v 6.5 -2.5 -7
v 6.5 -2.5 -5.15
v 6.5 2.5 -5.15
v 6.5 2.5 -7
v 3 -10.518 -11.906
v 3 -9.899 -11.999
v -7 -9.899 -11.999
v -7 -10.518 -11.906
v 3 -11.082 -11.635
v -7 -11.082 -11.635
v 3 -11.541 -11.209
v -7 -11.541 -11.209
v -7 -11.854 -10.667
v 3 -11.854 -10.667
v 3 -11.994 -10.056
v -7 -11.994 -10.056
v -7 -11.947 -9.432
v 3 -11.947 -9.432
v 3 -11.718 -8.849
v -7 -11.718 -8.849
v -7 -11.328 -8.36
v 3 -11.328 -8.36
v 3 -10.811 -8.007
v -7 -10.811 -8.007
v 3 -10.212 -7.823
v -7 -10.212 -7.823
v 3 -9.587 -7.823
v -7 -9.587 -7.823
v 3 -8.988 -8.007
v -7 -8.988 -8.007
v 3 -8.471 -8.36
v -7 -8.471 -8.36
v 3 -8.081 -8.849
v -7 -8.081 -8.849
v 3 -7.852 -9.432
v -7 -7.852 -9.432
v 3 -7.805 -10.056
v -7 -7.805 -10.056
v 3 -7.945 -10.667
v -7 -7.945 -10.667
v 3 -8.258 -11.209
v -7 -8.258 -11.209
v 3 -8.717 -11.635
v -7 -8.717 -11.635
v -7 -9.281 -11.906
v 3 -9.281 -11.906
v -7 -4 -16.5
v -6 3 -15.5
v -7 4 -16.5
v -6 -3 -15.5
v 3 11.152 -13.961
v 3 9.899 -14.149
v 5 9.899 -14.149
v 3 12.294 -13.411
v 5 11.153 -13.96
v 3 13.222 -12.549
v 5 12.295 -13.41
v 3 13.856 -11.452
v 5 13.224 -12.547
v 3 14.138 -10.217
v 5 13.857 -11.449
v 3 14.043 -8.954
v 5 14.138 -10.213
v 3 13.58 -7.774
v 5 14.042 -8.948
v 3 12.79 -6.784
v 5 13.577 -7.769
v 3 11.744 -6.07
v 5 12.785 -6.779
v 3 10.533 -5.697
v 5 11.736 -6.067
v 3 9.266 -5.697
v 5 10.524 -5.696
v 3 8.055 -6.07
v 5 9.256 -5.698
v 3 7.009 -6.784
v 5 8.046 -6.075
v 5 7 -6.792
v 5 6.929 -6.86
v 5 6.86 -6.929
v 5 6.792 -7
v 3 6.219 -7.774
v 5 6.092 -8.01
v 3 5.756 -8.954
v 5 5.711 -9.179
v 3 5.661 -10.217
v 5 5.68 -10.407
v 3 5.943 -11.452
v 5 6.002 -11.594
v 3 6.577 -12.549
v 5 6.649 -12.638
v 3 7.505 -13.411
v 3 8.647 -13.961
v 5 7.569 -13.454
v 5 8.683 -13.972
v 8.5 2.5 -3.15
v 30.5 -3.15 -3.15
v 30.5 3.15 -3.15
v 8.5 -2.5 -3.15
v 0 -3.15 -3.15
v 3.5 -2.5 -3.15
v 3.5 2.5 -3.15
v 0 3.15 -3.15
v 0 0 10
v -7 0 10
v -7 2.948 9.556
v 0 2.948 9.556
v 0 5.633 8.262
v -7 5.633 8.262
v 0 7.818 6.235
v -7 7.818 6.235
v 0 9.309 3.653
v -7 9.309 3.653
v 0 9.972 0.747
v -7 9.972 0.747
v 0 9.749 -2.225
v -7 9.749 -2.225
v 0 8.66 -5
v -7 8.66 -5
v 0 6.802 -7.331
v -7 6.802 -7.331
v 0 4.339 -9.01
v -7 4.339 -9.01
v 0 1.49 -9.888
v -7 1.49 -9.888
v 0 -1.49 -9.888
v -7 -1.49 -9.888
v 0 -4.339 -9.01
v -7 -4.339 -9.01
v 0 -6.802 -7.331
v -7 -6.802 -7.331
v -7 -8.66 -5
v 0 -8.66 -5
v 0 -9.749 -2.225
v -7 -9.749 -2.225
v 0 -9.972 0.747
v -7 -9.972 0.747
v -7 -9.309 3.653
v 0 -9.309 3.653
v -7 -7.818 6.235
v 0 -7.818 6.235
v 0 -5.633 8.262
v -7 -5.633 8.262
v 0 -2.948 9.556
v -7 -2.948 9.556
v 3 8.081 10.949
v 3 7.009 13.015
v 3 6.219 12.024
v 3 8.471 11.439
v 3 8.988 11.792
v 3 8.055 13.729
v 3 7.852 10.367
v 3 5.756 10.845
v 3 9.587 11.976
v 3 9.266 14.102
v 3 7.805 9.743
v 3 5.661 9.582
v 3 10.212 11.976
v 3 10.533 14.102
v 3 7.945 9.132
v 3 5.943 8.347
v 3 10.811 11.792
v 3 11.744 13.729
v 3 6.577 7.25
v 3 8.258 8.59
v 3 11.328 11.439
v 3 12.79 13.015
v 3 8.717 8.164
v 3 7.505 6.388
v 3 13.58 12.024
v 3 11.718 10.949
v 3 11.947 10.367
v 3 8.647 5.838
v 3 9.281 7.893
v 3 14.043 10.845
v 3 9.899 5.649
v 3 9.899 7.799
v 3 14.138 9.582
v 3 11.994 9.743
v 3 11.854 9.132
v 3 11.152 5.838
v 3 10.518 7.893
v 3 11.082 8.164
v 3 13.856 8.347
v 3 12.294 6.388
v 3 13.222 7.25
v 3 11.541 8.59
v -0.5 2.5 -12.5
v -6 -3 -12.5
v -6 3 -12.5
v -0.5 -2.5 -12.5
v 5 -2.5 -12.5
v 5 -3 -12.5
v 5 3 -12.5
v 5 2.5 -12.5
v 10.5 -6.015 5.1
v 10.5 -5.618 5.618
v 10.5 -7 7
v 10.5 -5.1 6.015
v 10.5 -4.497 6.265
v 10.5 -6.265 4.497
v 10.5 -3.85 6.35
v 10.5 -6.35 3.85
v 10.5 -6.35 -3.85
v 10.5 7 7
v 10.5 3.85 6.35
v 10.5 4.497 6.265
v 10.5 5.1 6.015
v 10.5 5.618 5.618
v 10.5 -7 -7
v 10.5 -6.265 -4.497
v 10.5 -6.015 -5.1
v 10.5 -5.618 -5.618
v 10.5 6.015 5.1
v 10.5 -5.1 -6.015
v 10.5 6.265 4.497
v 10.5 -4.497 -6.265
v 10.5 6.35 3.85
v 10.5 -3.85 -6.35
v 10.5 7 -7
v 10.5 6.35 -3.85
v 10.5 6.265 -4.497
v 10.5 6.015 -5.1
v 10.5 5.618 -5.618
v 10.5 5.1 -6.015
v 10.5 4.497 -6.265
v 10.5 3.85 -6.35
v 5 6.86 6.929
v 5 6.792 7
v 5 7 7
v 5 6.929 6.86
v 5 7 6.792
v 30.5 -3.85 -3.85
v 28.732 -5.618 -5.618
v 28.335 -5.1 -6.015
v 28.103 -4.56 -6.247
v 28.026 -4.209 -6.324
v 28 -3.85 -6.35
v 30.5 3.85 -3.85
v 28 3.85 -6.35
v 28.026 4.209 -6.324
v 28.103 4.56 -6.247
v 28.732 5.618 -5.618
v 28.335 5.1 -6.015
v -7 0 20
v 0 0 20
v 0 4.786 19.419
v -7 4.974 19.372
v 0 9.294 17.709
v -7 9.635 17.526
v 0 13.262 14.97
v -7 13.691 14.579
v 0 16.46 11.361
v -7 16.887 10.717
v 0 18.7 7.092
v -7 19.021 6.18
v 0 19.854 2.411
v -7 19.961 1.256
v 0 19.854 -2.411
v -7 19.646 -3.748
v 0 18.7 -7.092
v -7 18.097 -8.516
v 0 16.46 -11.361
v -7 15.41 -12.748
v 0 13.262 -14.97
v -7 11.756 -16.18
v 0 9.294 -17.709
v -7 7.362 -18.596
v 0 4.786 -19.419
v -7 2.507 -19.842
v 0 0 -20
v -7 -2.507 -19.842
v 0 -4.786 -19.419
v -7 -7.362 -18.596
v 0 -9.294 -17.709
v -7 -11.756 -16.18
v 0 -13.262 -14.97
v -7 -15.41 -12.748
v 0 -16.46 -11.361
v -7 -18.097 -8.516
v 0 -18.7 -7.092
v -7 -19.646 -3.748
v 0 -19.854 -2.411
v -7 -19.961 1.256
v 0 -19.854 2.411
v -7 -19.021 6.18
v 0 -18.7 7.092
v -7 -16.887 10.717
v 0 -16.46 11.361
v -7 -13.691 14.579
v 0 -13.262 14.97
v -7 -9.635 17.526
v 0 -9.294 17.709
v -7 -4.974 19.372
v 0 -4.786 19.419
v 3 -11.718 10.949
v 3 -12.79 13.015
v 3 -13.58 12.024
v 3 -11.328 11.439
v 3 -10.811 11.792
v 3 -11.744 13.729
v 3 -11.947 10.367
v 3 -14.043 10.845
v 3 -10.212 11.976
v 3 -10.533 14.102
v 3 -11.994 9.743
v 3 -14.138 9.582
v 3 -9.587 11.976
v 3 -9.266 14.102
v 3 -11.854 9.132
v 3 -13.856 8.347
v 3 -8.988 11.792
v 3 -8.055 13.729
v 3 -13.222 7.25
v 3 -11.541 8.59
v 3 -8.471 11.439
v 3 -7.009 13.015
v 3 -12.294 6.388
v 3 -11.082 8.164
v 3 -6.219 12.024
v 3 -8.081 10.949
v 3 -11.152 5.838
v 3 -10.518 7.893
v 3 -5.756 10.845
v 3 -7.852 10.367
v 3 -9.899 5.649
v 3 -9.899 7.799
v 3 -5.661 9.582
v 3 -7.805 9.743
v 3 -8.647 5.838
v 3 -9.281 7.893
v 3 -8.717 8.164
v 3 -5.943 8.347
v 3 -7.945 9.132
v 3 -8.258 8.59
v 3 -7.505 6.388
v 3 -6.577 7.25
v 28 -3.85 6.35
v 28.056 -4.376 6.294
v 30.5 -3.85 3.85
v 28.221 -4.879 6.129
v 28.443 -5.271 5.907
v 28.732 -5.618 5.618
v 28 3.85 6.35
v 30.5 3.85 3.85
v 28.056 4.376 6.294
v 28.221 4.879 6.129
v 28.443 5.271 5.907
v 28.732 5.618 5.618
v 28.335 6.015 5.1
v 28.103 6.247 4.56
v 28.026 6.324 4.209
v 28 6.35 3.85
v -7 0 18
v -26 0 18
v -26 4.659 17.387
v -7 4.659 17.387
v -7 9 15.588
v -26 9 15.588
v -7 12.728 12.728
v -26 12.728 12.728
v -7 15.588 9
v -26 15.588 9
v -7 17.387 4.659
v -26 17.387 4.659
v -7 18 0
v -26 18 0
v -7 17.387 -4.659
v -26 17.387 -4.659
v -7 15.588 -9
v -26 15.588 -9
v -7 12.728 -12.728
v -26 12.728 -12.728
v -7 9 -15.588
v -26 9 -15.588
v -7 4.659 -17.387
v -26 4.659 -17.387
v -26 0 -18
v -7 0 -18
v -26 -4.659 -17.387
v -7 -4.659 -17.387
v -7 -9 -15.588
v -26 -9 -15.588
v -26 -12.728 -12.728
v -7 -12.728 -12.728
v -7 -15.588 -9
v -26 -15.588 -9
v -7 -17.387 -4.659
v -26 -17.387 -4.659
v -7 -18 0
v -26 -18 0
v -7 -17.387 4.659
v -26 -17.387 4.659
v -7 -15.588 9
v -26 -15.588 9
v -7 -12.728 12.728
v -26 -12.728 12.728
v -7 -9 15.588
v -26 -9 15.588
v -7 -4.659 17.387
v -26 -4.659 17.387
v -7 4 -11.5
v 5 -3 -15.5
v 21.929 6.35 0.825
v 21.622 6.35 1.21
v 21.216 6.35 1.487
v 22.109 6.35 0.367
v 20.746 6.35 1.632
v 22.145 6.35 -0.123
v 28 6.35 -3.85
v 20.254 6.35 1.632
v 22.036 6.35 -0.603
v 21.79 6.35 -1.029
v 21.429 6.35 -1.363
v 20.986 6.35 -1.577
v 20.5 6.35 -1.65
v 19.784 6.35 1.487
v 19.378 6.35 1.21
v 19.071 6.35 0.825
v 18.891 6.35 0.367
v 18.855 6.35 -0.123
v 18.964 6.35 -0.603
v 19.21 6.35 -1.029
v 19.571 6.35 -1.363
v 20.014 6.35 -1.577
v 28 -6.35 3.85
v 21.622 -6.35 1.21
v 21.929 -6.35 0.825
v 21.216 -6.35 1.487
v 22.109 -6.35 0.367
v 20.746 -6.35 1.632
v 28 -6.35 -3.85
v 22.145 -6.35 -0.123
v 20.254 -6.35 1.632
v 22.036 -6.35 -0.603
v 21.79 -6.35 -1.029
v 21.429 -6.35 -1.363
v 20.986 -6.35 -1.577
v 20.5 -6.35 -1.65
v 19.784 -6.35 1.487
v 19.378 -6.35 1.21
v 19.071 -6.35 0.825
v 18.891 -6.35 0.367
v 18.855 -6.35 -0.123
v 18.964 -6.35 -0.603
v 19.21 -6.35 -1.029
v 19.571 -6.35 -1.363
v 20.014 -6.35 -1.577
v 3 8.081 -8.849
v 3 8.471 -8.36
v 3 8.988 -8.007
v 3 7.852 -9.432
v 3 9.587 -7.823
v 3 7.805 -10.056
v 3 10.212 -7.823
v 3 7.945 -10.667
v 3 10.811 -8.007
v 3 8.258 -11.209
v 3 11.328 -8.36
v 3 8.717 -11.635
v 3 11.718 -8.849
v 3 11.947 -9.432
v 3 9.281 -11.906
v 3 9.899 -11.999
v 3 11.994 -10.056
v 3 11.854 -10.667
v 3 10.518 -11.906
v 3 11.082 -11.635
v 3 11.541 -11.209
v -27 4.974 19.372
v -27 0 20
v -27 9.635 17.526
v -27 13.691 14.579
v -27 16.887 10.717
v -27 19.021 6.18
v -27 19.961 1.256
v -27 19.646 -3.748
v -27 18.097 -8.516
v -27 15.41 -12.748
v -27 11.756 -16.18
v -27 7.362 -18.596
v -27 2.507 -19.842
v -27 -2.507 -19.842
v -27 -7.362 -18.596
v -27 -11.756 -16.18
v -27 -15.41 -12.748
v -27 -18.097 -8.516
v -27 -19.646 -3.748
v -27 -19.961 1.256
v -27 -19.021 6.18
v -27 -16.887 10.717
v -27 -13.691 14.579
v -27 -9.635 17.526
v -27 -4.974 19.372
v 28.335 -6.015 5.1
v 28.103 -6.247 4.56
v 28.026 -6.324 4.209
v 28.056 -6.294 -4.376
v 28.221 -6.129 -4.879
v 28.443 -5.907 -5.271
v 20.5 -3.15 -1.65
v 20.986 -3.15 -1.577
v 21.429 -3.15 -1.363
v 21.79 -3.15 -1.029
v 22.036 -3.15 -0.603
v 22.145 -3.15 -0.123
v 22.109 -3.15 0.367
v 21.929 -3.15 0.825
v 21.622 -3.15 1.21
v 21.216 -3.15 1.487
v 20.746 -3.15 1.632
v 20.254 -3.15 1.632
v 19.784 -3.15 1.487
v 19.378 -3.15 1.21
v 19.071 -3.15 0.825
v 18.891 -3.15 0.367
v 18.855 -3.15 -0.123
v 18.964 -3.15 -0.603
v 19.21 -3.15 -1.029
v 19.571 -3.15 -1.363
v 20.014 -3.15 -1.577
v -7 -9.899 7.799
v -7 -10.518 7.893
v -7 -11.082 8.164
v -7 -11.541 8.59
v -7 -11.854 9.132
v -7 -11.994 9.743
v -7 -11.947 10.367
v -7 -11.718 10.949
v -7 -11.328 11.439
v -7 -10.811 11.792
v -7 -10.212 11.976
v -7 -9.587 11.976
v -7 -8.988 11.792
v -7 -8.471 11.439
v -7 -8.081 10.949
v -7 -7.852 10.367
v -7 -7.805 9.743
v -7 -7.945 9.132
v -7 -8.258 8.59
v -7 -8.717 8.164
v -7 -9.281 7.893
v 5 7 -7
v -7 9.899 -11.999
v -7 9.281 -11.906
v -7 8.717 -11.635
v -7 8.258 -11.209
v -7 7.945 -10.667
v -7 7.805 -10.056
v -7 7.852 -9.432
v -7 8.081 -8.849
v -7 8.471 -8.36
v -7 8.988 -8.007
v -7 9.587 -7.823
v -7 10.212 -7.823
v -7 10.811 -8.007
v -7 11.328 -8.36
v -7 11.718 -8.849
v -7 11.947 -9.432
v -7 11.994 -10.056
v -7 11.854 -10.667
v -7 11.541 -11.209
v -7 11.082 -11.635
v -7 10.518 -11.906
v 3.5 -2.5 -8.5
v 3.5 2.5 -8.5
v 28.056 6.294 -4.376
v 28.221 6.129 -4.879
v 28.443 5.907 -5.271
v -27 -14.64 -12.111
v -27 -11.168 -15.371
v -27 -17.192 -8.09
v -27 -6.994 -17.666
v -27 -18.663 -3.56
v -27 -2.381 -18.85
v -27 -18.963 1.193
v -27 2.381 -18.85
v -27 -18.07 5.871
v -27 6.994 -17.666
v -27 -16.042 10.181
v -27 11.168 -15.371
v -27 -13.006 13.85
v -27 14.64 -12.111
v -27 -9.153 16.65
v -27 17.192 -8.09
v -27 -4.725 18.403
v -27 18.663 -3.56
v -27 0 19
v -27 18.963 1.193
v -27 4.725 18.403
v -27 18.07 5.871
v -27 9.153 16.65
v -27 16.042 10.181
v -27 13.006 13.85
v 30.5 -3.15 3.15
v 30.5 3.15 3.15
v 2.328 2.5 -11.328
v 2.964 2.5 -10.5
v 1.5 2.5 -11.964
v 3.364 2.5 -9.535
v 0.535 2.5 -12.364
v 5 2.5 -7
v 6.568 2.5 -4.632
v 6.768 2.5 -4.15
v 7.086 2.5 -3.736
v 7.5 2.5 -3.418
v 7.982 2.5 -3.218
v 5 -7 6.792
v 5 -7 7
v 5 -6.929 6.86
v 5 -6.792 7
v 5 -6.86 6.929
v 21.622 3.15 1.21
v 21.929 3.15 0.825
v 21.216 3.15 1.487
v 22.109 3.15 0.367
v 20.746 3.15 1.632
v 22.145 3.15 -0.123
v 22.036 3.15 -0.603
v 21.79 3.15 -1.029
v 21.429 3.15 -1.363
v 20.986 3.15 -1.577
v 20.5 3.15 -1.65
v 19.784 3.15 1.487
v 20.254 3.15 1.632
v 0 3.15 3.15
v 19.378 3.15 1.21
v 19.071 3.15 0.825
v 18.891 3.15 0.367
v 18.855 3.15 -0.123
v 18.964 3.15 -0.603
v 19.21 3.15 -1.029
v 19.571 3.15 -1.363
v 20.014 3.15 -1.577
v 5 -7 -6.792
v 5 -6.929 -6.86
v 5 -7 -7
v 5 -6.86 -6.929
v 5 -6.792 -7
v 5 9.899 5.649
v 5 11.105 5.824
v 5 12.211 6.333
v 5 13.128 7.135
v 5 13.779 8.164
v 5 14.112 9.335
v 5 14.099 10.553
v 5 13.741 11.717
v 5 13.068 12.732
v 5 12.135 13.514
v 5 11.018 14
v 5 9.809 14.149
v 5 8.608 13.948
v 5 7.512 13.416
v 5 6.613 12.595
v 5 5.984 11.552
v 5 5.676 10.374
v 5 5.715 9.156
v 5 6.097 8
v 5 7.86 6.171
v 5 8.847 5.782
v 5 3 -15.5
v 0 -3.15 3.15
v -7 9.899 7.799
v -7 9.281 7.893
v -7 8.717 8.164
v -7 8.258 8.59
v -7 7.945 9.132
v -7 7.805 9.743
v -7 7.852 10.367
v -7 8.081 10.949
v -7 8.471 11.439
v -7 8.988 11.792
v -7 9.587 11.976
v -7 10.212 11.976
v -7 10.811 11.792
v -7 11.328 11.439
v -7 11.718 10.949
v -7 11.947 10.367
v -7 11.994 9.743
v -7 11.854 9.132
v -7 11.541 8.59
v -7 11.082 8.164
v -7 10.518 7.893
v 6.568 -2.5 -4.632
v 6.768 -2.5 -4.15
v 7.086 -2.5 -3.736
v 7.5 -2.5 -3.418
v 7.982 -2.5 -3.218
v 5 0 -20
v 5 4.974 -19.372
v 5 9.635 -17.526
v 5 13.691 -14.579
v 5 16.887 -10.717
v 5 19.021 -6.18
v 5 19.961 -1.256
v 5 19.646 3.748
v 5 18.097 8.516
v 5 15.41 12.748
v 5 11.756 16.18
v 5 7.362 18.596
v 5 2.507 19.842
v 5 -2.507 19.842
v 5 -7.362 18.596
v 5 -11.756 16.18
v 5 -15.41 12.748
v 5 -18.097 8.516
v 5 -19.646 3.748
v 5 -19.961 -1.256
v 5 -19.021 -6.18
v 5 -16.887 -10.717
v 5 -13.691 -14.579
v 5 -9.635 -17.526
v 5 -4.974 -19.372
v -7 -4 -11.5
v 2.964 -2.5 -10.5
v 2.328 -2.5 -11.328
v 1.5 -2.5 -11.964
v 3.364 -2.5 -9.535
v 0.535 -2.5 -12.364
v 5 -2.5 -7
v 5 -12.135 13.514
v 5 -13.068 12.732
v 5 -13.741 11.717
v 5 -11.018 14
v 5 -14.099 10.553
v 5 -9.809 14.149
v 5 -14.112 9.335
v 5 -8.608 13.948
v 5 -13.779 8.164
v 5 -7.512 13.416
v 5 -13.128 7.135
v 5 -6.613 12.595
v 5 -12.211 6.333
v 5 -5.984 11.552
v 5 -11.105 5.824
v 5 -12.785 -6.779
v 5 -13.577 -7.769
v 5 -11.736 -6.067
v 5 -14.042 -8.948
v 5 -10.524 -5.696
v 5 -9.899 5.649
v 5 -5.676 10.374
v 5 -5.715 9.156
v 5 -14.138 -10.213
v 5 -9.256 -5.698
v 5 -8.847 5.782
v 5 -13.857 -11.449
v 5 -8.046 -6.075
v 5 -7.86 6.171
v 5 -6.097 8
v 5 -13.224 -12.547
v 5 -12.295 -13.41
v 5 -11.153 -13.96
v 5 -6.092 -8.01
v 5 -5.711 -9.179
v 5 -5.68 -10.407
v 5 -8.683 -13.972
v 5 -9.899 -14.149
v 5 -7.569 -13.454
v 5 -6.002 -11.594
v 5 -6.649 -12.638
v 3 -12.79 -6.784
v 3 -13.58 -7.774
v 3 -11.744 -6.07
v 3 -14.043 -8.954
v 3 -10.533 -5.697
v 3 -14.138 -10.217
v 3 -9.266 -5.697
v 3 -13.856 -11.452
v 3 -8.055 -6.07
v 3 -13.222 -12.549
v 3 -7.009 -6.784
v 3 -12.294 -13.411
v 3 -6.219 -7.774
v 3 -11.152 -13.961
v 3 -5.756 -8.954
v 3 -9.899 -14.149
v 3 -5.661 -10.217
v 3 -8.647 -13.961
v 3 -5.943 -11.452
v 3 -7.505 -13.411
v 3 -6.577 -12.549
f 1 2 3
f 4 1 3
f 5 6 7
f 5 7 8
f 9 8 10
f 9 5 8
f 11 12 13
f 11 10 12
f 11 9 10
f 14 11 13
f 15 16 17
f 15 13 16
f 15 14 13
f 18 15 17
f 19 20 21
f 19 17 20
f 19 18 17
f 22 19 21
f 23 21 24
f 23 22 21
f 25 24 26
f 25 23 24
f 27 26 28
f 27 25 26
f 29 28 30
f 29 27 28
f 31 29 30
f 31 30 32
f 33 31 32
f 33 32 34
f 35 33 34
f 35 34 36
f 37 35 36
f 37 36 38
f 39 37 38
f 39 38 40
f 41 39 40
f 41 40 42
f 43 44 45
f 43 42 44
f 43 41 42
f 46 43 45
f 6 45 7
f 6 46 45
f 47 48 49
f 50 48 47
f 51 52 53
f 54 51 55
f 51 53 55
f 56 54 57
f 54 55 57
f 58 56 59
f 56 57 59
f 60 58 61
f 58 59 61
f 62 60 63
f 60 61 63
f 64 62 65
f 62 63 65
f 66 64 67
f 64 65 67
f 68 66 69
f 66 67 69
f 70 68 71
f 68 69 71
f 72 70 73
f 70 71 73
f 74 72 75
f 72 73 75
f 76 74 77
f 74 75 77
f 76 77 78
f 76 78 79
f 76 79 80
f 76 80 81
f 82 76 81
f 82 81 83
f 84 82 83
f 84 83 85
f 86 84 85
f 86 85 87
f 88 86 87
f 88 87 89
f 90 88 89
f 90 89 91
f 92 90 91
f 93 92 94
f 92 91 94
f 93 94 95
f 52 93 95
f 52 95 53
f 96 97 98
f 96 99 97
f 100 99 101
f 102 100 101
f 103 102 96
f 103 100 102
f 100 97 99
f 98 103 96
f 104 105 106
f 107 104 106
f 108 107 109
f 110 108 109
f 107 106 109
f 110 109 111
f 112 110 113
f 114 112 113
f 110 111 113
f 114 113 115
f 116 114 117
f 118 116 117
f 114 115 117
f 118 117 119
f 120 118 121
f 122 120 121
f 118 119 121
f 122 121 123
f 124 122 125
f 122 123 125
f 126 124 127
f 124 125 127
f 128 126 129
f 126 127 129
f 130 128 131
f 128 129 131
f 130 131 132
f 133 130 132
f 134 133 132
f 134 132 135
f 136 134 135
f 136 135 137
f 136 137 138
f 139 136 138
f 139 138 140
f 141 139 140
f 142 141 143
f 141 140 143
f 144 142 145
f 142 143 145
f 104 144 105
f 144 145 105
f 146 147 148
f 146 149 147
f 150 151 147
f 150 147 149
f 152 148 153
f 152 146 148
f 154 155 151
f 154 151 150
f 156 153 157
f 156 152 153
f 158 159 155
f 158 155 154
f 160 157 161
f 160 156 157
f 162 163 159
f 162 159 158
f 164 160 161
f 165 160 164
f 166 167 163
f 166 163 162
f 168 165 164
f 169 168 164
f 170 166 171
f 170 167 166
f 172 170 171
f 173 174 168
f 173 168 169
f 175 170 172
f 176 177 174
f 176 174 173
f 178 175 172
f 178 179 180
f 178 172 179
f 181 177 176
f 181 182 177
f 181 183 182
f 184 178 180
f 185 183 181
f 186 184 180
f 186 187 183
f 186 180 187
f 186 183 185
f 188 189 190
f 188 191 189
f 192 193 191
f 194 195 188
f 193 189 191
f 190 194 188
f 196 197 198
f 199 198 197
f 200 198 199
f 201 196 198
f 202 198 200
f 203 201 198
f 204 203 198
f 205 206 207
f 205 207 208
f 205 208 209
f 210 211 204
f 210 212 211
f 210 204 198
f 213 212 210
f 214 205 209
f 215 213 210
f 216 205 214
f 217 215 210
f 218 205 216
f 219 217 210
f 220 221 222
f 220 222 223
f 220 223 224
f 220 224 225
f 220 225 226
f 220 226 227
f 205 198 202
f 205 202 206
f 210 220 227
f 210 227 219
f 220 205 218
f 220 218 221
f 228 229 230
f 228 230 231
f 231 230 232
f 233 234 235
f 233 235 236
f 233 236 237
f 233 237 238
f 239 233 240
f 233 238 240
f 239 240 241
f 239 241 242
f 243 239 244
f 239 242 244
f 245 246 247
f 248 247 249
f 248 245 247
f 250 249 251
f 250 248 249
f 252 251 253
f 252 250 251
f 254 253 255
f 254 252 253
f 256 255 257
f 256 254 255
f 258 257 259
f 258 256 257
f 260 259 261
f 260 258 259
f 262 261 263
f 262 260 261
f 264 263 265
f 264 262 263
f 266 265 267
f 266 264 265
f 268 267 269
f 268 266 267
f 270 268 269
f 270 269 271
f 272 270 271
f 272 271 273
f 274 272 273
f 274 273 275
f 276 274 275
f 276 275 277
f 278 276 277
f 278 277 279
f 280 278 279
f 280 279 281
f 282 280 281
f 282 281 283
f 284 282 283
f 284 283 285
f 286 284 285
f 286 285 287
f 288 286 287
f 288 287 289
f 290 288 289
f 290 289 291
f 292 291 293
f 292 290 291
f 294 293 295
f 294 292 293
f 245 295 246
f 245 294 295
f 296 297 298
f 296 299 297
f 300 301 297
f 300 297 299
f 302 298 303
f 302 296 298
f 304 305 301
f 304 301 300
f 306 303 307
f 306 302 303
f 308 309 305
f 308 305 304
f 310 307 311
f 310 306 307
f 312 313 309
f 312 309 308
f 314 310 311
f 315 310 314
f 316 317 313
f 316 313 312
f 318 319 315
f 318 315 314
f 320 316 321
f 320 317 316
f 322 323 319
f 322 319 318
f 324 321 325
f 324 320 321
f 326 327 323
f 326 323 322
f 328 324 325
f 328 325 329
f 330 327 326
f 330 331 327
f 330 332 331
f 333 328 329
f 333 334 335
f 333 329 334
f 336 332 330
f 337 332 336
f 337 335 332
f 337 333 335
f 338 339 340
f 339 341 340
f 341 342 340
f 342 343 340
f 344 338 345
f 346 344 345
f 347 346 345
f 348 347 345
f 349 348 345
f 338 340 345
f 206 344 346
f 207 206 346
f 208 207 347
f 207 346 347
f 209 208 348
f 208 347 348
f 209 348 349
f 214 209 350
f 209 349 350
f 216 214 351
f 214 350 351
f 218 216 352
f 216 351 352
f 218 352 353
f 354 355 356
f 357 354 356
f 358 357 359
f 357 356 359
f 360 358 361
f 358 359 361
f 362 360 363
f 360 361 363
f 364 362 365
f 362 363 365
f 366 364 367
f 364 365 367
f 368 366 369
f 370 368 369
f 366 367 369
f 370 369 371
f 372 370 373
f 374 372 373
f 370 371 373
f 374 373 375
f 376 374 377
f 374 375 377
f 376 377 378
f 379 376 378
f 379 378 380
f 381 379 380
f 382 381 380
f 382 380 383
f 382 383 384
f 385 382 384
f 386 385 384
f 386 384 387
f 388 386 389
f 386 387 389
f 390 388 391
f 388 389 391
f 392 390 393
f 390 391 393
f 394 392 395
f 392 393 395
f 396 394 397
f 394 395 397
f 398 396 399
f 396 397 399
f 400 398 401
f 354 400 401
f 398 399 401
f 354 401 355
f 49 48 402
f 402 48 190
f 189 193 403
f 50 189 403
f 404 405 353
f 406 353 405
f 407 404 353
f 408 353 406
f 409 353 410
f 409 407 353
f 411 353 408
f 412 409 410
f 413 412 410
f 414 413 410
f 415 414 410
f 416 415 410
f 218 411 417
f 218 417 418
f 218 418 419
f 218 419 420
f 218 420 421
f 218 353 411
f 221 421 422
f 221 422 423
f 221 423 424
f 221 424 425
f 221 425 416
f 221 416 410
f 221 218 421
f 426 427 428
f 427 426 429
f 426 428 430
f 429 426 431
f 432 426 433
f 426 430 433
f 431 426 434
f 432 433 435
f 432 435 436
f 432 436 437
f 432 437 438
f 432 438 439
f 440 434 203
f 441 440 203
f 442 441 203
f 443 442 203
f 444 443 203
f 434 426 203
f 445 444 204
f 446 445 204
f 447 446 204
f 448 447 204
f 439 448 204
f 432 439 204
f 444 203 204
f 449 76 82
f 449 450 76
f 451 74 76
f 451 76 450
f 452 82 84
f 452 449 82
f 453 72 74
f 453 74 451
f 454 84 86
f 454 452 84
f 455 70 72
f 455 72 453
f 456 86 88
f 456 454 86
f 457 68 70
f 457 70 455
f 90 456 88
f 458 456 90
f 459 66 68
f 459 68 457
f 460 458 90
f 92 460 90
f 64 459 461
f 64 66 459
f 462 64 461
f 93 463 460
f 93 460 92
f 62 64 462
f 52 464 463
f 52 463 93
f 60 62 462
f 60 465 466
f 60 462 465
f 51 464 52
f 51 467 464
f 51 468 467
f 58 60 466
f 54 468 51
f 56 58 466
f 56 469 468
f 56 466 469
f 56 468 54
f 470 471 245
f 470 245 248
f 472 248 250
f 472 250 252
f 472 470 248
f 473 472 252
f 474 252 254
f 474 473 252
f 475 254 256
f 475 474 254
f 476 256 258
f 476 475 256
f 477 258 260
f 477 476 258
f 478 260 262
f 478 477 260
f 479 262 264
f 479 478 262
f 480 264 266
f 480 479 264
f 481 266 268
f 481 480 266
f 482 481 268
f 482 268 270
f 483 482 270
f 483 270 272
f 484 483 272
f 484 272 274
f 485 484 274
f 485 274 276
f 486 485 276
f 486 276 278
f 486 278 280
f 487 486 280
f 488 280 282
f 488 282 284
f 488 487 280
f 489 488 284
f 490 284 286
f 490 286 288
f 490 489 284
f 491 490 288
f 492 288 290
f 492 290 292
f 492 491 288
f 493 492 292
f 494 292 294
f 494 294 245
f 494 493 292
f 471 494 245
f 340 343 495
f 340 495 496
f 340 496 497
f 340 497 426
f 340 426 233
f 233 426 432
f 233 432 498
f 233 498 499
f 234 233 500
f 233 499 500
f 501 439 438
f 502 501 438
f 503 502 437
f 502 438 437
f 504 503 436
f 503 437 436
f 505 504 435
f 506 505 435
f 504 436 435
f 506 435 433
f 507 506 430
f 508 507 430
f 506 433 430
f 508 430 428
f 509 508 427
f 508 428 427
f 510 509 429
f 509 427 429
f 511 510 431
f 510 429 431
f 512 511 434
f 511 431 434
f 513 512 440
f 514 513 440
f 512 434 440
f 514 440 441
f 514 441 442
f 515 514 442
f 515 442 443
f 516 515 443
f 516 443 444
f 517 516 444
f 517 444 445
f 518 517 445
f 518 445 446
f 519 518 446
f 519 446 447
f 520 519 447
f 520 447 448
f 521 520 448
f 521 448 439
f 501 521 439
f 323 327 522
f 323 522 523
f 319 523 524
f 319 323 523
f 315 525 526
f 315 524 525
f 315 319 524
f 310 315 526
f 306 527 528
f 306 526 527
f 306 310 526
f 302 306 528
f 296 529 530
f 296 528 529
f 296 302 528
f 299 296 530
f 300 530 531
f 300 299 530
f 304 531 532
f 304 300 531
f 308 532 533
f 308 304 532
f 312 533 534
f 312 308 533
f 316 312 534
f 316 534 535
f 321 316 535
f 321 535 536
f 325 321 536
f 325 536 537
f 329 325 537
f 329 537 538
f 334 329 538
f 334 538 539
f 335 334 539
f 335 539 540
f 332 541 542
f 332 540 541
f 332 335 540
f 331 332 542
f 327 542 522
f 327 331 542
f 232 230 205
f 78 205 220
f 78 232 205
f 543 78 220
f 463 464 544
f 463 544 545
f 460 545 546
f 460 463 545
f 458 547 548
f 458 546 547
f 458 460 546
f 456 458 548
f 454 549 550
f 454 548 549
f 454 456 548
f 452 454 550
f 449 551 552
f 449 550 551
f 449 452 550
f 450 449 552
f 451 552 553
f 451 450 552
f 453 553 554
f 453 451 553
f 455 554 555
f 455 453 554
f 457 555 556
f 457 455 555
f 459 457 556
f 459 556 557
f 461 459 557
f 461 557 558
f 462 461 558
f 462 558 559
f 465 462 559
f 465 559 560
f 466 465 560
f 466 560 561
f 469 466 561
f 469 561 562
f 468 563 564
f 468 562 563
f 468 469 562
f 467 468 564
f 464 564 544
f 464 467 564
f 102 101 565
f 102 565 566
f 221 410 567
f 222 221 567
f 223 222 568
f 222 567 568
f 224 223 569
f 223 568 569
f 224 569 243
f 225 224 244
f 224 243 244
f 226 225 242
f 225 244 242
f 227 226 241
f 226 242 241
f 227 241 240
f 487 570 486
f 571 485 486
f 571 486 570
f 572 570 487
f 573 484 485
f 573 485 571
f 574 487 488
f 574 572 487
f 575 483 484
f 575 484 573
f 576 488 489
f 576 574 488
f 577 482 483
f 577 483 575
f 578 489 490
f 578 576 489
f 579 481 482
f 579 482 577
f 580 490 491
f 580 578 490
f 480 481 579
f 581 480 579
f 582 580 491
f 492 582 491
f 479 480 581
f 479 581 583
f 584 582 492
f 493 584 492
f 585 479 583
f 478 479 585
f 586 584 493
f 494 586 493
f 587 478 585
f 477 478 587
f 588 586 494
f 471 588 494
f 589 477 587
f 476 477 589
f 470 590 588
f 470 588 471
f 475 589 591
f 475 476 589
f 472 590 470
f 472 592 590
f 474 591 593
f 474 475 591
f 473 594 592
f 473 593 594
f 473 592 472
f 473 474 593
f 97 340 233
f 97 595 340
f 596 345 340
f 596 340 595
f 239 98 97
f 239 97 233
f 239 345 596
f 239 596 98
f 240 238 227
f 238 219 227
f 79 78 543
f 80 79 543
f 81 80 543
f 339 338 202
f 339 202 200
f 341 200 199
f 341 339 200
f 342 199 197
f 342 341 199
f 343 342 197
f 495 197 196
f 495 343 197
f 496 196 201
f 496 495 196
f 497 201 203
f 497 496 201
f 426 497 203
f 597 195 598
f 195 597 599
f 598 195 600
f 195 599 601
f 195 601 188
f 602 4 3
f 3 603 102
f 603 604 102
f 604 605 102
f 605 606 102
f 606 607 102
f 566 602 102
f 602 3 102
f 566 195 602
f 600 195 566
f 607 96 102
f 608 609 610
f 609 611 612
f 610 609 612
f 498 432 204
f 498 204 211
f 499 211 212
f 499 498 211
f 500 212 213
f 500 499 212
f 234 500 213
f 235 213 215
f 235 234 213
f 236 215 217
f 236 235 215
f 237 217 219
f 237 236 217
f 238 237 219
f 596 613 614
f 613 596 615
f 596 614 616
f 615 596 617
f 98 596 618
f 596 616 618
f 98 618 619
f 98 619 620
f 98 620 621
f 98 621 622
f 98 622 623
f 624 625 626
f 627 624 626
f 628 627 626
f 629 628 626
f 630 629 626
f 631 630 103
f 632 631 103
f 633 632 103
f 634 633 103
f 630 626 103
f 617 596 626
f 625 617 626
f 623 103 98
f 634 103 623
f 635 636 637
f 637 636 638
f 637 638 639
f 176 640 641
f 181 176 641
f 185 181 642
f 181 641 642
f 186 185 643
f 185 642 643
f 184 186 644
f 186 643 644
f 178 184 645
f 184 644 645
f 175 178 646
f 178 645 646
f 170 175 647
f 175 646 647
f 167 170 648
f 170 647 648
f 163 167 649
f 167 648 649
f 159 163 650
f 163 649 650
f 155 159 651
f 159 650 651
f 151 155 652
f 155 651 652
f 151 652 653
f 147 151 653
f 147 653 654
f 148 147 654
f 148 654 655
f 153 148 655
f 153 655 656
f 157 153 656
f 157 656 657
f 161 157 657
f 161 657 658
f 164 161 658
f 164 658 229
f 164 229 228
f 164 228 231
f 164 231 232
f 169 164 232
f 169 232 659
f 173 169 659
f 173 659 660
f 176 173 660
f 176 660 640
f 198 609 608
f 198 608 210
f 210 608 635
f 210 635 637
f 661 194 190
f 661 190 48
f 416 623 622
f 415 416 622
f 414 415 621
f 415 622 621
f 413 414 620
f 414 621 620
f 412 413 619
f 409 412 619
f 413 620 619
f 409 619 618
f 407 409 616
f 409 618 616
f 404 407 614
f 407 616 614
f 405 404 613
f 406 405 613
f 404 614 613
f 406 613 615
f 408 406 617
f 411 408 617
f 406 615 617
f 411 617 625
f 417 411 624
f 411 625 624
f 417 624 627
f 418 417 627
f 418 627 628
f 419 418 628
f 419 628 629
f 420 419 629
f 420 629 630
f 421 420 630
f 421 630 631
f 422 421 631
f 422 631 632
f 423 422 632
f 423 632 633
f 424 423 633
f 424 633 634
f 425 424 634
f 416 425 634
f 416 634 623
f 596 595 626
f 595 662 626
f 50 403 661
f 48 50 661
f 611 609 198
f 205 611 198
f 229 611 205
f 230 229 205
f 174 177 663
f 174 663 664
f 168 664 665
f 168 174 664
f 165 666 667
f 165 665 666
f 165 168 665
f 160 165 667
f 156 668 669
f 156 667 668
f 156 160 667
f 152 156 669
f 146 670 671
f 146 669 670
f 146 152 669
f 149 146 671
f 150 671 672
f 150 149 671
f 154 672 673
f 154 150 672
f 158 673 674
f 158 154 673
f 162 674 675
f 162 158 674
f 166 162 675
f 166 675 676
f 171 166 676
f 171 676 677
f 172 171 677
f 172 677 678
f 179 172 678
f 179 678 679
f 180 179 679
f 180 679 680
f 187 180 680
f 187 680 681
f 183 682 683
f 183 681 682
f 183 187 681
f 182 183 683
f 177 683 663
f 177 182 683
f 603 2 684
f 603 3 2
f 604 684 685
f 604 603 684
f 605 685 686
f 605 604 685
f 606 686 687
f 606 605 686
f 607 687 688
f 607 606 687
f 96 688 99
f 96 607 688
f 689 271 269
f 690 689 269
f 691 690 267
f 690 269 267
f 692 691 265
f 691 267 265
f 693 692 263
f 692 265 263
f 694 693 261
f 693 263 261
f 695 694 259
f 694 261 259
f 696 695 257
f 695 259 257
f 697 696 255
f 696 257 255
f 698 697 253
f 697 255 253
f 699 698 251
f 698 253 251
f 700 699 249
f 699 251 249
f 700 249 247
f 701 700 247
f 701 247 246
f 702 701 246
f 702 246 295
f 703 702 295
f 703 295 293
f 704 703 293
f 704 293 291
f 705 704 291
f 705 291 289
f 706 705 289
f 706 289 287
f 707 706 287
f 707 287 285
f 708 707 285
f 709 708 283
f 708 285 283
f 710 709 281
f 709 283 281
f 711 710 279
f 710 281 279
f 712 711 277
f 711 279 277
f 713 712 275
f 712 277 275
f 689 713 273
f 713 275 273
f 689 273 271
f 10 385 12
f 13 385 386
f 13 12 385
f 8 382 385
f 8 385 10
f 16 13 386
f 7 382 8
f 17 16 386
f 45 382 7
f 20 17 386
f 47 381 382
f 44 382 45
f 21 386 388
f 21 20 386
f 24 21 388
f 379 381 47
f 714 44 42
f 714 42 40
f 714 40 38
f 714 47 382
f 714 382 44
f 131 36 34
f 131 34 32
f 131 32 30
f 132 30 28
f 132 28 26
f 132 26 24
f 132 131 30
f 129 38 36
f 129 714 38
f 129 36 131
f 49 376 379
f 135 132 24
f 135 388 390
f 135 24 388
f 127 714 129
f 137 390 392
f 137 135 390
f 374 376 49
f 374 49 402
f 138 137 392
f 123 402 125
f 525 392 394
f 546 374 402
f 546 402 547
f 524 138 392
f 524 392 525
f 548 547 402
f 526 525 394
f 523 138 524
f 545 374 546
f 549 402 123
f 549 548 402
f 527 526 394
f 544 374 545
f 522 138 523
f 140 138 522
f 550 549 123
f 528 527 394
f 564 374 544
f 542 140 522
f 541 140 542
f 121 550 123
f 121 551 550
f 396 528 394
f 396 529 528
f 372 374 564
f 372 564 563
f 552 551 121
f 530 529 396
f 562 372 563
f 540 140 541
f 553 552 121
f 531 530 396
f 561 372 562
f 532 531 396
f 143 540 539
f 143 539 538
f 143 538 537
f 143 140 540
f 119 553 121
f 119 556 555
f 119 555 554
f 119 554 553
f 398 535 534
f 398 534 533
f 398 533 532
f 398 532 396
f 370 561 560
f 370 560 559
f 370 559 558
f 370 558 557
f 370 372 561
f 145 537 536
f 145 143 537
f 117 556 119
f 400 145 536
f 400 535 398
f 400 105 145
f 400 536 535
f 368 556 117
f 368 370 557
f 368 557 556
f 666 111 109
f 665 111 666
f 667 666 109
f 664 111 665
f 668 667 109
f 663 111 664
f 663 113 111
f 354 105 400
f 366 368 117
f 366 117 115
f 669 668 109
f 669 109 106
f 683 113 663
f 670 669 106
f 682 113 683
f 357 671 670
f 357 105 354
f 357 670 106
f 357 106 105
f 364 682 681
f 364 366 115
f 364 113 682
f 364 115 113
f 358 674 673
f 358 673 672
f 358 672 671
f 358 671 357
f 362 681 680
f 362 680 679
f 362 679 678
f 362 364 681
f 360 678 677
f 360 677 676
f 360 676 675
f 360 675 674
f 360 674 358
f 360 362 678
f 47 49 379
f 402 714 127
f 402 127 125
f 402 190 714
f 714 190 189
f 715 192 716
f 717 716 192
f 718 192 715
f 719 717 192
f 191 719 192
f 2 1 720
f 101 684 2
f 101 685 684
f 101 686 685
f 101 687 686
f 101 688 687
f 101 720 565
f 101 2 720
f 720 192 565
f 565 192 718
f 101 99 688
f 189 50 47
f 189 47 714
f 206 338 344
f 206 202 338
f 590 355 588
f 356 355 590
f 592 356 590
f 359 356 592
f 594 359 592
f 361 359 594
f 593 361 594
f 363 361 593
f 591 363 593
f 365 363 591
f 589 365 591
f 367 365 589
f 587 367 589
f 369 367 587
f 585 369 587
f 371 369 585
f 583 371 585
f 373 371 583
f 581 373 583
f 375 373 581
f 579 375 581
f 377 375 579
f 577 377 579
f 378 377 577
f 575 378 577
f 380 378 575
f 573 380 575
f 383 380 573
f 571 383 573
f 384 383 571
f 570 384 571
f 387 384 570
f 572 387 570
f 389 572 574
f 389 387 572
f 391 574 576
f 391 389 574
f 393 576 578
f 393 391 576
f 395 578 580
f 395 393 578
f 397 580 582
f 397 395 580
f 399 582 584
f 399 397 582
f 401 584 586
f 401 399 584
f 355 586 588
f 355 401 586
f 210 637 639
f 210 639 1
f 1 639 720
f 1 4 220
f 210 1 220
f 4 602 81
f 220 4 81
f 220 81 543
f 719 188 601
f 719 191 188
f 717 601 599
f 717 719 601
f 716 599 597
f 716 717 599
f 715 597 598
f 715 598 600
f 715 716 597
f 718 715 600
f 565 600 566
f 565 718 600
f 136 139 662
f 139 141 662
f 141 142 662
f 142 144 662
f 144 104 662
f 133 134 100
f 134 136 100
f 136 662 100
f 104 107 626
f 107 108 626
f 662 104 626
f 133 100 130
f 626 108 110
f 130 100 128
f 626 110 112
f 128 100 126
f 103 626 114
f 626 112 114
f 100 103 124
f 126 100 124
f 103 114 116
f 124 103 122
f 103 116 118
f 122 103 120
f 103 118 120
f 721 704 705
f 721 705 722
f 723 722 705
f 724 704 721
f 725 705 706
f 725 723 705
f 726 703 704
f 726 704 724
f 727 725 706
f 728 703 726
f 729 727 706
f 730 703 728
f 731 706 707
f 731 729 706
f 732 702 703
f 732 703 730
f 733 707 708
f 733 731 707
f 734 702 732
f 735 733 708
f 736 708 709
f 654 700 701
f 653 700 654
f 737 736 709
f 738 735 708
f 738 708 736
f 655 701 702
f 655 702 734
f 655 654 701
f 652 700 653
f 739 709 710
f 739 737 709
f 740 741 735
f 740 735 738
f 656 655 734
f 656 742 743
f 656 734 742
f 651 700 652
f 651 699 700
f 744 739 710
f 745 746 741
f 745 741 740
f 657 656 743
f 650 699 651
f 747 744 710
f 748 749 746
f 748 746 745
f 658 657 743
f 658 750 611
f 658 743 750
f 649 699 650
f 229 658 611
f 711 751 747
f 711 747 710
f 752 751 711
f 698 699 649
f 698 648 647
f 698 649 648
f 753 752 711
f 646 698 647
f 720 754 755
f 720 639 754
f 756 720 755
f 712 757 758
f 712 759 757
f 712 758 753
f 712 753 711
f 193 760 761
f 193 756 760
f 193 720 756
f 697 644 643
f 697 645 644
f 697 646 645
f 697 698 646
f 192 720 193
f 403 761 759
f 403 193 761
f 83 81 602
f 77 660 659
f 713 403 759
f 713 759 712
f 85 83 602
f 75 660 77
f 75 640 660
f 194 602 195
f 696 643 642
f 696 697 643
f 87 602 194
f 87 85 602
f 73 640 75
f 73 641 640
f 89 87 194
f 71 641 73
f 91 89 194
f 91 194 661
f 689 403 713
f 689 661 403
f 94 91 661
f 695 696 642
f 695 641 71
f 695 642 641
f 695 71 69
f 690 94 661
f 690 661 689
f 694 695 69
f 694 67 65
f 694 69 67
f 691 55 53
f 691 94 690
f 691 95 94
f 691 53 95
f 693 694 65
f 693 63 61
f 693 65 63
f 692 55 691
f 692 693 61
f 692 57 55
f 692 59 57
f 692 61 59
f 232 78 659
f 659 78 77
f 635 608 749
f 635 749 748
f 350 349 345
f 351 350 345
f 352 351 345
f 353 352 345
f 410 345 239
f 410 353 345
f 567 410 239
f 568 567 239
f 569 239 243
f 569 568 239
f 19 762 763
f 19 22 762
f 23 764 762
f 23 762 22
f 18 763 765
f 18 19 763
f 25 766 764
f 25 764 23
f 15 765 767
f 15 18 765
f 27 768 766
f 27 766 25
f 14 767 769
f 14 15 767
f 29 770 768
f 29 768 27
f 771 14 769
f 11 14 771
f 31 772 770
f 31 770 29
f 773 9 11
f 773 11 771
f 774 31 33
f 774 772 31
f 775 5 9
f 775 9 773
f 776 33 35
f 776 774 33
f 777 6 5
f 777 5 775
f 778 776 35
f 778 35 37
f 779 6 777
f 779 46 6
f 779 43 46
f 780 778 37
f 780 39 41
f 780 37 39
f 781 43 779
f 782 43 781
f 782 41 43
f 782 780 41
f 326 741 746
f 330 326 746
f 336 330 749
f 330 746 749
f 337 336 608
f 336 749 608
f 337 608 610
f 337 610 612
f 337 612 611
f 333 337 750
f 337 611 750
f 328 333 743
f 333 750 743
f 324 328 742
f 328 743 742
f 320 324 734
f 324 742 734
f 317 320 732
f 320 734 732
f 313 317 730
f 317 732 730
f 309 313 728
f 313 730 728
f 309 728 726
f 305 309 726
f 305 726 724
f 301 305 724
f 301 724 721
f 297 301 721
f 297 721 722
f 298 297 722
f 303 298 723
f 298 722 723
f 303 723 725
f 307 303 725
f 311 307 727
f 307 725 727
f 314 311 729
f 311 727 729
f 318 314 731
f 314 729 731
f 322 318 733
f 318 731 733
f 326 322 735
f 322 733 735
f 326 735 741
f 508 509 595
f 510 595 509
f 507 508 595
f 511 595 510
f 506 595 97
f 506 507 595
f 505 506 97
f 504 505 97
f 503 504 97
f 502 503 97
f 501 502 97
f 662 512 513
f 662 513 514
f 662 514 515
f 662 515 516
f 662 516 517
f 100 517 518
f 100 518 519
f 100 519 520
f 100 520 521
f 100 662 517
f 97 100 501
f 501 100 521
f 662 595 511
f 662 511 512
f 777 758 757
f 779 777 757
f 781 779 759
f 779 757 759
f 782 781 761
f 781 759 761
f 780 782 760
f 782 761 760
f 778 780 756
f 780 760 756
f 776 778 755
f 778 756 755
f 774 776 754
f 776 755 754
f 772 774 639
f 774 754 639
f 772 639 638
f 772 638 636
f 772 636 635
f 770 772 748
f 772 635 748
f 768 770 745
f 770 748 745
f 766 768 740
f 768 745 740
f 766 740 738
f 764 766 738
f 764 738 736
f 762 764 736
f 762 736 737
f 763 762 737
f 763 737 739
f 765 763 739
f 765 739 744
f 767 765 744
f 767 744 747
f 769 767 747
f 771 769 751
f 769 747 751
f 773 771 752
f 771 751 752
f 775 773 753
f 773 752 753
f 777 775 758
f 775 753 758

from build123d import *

# Parameters (mm, degrees)
SKETCH_1_R               = 20
EXTRUDE_1_DEPTH          = 5
SKETCH_2_W               = 6.3
SKETCH_2_H               = 6.3
CUT_EXTRUDE_1_DEPTH      = 5
EXTRUDE_START            = 7
SKETCH_4_R               = 20
SKETCH_4_R_2             = 10
EXTRUDE_2_DEPTH          = 7
CUT_EXTRUDE_2_DEPTH      = 20
CUT_EXTRUDE_2_DEPTH_BACK = 20
SKETCH_3_R               = 2.1
SKETCH_5_W               = 3
SKETCH_5_H               = 6
CUT_EXTRUDE_3_DEPTH      = 13
CHAMFER_1_SIZE           = 1
EXTRUDE_START_2          = 20
SKETCH_6_R               = 20
SKETCH_6_R_2             = 18
EXTRUDE_3_DEPTH          = 20
CHAMFER_2_SIZE           = 1
SKETCH_7_R               = 4.25
CUT_EXTRUDE_4_DEPTH      = 2
SKETCH_8_W               = 14
SKETCH_8_H               = 14
EXTRUDE_4_DEPTH          = 5.5
SKETCH_9_W               = 6.3
SKETCH_9_H               = 6.3
CUT_EXTRUDE_5_DEPTH      = 10
CUT_EXTRUDE_6_DEPTH      = 6
CUT_EXTRUDE_6_DEPTH_BACK = 5
SKETCH_10_W              = 3
SKETCH_10_H              = 5
FILLET_1_R               = 4
FILLET_2_R               = 2
SKETCH_11_W              = 12.7
SKETCH_11_H              = 12.7
SKETCH_11_W_2            = 6.3
SKETCH_11_H_2            = 6.3
EXTRUDE_5_DEPTH          = 20
CHAMFER_3_SIZE           = 2.5
SKETCH_12_R              = 1.65
CUT_EXTRUDE_7_DEPTH      = 20
FILLET_3_R               = 2.5


with BuildPart() as part:
    # 草图1 → 凸台-拉伸1 (new body)
    with BuildSketch(Plane(origin=(0, 0, 0), x_dir=(0, 0, -1), z_dir=(1, 0, 0))):
        Circle(SKETCH_1_R)
    extrude(amount=EXTRUDE_1_DEPTH)

    # 草图2 → 切除-拉伸1 (cut)
    with BuildSketch(Plane(origin=(5, 0, 0), x_dir=(0, 0, -1), z_dir=(1, 0, 0))):
        Rectangle(SKETCH_2_W, SKETCH_2_H)
    extrude(amount=-CUT_EXTRUDE_1_DEPTH, mode=Mode.SUBTRACT)

    # 草图4 → 凸台-拉伸2 (add)
    with BuildSketch(Plane.ZY.offset(EXTRUDE_START)):
        Circle(SKETCH_4_R)
        Circle(SKETCH_4_R_2, mode=Mode.SUBTRACT)
    extrude(amount=-EXTRUDE_2_DEPTH)

    # 草图3 → 切除-拉伸2 (cut, two sides: drawn at the far end of the back side and taken through both)
    with BuildSketch(Plane.ZY.offset(-CUT_EXTRUDE_2_DEPTH_BACK)):
        with Locations(Location((9.899494937, -9.899494937, 0), (0, 0, 180))):
            Circle(SKETCH_3_R)
        with Locations(Location((-9.899494937, -9.899494937, 0), (0, 0, 180))):
            Circle(SKETCH_3_R)
        with Locations(Location((-9.899494937, 9.899494937, 0), (0, 0, 180))):
            Circle(SKETCH_3_R)
        with Locations(Location((9.899494937, 9.899494937, 0), (0, 0, 180))):
            Circle(SKETCH_3_R)
    extrude(amount=CUT_EXTRUDE_2_DEPTH + CUT_EXTRUDE_2_DEPTH_BACK, mode=Mode.SUBTRACT)

    # 草图5 → 切除-拉伸3 (cut)
    with BuildSketch(Plane(origin=(5, 0, 0), x_dir=(0, 0, -1), z_dir=(1, 0, 0))):
        with Locations((14, 0)):
            Rectangle(SKETCH_5_W, SKETCH_5_H)
    extrude(amount=-CUT_EXTRUDE_3_DEPTH, mode=Mode.SUBTRACT)

    # 倒角1
    chamfer_1_edges = [part.edges().sort_by_distance(p)[0] for p in [
        (-7, -3, -14),
        (-7, 0, -15.5),
        (-7, 3, -14),
        (-7, 0, -12.5),
    ]]
    chamfer(chamfer_1_edges, length=CHAMFER_1_SIZE)

    # 草图6 → 凸台-拉伸3 (add)
    with BuildSketch(Plane.ZY.offset(7).offset(EXTRUDE_START_2)):
        Circle(SKETCH_6_R)
        Circle(SKETCH_6_R_2, mode=Mode.SUBTRACT)
    extrude(amount=-EXTRUDE_3_DEPTH)

    # 倒角2
    chamfer_2_edges = [part.edges().sort_by_distance(p)[0] for p in [
        (-27, 0, -18),
    ]]
    chamfer(chamfer_2_edges, length=CHAMFER_2_SIZE)

    # 草图7 → 切除-拉伸4 (cut)
    with BuildSketch(Plane(origin=(5, 0, 0), x_dir=(0, 0, -1), z_dir=(1, 0, 0))):
        with Locations((-9.899494937, 9.899494937)):
            Circle(SKETCH_7_R)
        with Locations((9.899494937, 9.899494937)):
            Circle(SKETCH_7_R)
        with Locations((9.899494937, -9.899494937)):
            Circle(SKETCH_7_R)
        with Locations((-9.899494937, -9.899494937)):
            Circle(SKETCH_7_R)
    extrude(amount=-CUT_EXTRUDE_4_DEPTH, mode=Mode.SUBTRACT)

    # 草图8 → 凸台-拉伸4 (add)
    with BuildSketch(Plane(origin=(5, 0, 0), x_dir=(0, 0, -1), z_dir=(1, 0, 0))):
        Rectangle(SKETCH_8_W, SKETCH_8_H)
    extrude(amount=EXTRUDE_4_DEPTH)

    # 草图9 → 切除-拉伸5 (cut)
    with BuildSketch(Plane.ZY.offset(-5)):
        Rectangle(SKETCH_9_W, SKETCH_9_H)
    extrude(amount=-CUT_EXTRUDE_5_DEPTH, mode=Mode.SUBTRACT)

    # 草图10 → 切除-拉伸6 (cut, two sides: drawn at the far end of the back side and taken through both)
    with BuildSketch(Plane(origin=(0, 0, -7), x_dir=(-1, 0, 0), z_dir=(0, 0, -1)).offset(-CUT_EXTRUDE_6_DEPTH_BACK)):
        with Locations((-5, 0)):
            Rectangle(SKETCH_10_W, SKETCH_10_H)
    extrude(amount=CUT_EXTRUDE_6_DEPTH + CUT_EXTRUDE_6_DEPTH_BACK, mode=Mode.SUBTRACT)

    # 圆角1
    fillet_1_edges = [part.edges().sort_by_distance(p)[0] for p in [
        (3.5, 0, -12.5),
    ]]
    fillet(fillet_1_edges, radius=FILLET_1_R)

    # 圆角2
    fillet_2_edges = [part.edges().sort_by_distance(p)[0] for p in [
        (6.5, 0, -3.15),
    ]]
    fillet(fillet_2_edges, radius=FILLET_2_R)

    # 草图11 → 凸台-拉伸5 (add)
    with BuildSketch(Plane(origin=(10.5, 0, 0), x_dir=(0, 0, -1), z_dir=(1, 0, 0))):
        Rectangle(SKETCH_11_W, SKETCH_11_H)
        Rectangle(SKETCH_11_W_2, SKETCH_11_H_2, mode=Mode.SUBTRACT)
    extrude(amount=EXTRUDE_5_DEPTH)

    # 倒角3
    chamfer_3_edges = [part.edges().sort_by_distance(p)[0] for p in [
        (30.5, 0, 6.35),
        (30.5, -6.35, 0),
        (30.5, 0, -6.35),
        (30.5, 6.35, 0),
    ]]
    chamfer(chamfer_3_edges, length=CHAMFER_3_SIZE)

    # 草图12 → 切除-拉伸7 (cut)
    with BuildSketch(Plane.XZ.offset(6.35)):
        with Locations(Location((20.5, 0, 0), (0, 0, 270))):
            Circle(SKETCH_12_R)
    extrude(amount=-CUT_EXTRUDE_7_DEPTH, mode=Mode.SUBTRACT)

    # 圆角3
    fillet_3_edges = [part.edges().sort_by_distance(p)[0] for p in [
        (19.25, 6.35, 6.35),
        (19.25, 6.35, -6.35),
        (19.25, -6.35, -6.35),
        (19.25, -6.35, 6.35),
    ]]
    fillet(fillet_3_edges, radius=FILLET_3_R)


solid = part.part
